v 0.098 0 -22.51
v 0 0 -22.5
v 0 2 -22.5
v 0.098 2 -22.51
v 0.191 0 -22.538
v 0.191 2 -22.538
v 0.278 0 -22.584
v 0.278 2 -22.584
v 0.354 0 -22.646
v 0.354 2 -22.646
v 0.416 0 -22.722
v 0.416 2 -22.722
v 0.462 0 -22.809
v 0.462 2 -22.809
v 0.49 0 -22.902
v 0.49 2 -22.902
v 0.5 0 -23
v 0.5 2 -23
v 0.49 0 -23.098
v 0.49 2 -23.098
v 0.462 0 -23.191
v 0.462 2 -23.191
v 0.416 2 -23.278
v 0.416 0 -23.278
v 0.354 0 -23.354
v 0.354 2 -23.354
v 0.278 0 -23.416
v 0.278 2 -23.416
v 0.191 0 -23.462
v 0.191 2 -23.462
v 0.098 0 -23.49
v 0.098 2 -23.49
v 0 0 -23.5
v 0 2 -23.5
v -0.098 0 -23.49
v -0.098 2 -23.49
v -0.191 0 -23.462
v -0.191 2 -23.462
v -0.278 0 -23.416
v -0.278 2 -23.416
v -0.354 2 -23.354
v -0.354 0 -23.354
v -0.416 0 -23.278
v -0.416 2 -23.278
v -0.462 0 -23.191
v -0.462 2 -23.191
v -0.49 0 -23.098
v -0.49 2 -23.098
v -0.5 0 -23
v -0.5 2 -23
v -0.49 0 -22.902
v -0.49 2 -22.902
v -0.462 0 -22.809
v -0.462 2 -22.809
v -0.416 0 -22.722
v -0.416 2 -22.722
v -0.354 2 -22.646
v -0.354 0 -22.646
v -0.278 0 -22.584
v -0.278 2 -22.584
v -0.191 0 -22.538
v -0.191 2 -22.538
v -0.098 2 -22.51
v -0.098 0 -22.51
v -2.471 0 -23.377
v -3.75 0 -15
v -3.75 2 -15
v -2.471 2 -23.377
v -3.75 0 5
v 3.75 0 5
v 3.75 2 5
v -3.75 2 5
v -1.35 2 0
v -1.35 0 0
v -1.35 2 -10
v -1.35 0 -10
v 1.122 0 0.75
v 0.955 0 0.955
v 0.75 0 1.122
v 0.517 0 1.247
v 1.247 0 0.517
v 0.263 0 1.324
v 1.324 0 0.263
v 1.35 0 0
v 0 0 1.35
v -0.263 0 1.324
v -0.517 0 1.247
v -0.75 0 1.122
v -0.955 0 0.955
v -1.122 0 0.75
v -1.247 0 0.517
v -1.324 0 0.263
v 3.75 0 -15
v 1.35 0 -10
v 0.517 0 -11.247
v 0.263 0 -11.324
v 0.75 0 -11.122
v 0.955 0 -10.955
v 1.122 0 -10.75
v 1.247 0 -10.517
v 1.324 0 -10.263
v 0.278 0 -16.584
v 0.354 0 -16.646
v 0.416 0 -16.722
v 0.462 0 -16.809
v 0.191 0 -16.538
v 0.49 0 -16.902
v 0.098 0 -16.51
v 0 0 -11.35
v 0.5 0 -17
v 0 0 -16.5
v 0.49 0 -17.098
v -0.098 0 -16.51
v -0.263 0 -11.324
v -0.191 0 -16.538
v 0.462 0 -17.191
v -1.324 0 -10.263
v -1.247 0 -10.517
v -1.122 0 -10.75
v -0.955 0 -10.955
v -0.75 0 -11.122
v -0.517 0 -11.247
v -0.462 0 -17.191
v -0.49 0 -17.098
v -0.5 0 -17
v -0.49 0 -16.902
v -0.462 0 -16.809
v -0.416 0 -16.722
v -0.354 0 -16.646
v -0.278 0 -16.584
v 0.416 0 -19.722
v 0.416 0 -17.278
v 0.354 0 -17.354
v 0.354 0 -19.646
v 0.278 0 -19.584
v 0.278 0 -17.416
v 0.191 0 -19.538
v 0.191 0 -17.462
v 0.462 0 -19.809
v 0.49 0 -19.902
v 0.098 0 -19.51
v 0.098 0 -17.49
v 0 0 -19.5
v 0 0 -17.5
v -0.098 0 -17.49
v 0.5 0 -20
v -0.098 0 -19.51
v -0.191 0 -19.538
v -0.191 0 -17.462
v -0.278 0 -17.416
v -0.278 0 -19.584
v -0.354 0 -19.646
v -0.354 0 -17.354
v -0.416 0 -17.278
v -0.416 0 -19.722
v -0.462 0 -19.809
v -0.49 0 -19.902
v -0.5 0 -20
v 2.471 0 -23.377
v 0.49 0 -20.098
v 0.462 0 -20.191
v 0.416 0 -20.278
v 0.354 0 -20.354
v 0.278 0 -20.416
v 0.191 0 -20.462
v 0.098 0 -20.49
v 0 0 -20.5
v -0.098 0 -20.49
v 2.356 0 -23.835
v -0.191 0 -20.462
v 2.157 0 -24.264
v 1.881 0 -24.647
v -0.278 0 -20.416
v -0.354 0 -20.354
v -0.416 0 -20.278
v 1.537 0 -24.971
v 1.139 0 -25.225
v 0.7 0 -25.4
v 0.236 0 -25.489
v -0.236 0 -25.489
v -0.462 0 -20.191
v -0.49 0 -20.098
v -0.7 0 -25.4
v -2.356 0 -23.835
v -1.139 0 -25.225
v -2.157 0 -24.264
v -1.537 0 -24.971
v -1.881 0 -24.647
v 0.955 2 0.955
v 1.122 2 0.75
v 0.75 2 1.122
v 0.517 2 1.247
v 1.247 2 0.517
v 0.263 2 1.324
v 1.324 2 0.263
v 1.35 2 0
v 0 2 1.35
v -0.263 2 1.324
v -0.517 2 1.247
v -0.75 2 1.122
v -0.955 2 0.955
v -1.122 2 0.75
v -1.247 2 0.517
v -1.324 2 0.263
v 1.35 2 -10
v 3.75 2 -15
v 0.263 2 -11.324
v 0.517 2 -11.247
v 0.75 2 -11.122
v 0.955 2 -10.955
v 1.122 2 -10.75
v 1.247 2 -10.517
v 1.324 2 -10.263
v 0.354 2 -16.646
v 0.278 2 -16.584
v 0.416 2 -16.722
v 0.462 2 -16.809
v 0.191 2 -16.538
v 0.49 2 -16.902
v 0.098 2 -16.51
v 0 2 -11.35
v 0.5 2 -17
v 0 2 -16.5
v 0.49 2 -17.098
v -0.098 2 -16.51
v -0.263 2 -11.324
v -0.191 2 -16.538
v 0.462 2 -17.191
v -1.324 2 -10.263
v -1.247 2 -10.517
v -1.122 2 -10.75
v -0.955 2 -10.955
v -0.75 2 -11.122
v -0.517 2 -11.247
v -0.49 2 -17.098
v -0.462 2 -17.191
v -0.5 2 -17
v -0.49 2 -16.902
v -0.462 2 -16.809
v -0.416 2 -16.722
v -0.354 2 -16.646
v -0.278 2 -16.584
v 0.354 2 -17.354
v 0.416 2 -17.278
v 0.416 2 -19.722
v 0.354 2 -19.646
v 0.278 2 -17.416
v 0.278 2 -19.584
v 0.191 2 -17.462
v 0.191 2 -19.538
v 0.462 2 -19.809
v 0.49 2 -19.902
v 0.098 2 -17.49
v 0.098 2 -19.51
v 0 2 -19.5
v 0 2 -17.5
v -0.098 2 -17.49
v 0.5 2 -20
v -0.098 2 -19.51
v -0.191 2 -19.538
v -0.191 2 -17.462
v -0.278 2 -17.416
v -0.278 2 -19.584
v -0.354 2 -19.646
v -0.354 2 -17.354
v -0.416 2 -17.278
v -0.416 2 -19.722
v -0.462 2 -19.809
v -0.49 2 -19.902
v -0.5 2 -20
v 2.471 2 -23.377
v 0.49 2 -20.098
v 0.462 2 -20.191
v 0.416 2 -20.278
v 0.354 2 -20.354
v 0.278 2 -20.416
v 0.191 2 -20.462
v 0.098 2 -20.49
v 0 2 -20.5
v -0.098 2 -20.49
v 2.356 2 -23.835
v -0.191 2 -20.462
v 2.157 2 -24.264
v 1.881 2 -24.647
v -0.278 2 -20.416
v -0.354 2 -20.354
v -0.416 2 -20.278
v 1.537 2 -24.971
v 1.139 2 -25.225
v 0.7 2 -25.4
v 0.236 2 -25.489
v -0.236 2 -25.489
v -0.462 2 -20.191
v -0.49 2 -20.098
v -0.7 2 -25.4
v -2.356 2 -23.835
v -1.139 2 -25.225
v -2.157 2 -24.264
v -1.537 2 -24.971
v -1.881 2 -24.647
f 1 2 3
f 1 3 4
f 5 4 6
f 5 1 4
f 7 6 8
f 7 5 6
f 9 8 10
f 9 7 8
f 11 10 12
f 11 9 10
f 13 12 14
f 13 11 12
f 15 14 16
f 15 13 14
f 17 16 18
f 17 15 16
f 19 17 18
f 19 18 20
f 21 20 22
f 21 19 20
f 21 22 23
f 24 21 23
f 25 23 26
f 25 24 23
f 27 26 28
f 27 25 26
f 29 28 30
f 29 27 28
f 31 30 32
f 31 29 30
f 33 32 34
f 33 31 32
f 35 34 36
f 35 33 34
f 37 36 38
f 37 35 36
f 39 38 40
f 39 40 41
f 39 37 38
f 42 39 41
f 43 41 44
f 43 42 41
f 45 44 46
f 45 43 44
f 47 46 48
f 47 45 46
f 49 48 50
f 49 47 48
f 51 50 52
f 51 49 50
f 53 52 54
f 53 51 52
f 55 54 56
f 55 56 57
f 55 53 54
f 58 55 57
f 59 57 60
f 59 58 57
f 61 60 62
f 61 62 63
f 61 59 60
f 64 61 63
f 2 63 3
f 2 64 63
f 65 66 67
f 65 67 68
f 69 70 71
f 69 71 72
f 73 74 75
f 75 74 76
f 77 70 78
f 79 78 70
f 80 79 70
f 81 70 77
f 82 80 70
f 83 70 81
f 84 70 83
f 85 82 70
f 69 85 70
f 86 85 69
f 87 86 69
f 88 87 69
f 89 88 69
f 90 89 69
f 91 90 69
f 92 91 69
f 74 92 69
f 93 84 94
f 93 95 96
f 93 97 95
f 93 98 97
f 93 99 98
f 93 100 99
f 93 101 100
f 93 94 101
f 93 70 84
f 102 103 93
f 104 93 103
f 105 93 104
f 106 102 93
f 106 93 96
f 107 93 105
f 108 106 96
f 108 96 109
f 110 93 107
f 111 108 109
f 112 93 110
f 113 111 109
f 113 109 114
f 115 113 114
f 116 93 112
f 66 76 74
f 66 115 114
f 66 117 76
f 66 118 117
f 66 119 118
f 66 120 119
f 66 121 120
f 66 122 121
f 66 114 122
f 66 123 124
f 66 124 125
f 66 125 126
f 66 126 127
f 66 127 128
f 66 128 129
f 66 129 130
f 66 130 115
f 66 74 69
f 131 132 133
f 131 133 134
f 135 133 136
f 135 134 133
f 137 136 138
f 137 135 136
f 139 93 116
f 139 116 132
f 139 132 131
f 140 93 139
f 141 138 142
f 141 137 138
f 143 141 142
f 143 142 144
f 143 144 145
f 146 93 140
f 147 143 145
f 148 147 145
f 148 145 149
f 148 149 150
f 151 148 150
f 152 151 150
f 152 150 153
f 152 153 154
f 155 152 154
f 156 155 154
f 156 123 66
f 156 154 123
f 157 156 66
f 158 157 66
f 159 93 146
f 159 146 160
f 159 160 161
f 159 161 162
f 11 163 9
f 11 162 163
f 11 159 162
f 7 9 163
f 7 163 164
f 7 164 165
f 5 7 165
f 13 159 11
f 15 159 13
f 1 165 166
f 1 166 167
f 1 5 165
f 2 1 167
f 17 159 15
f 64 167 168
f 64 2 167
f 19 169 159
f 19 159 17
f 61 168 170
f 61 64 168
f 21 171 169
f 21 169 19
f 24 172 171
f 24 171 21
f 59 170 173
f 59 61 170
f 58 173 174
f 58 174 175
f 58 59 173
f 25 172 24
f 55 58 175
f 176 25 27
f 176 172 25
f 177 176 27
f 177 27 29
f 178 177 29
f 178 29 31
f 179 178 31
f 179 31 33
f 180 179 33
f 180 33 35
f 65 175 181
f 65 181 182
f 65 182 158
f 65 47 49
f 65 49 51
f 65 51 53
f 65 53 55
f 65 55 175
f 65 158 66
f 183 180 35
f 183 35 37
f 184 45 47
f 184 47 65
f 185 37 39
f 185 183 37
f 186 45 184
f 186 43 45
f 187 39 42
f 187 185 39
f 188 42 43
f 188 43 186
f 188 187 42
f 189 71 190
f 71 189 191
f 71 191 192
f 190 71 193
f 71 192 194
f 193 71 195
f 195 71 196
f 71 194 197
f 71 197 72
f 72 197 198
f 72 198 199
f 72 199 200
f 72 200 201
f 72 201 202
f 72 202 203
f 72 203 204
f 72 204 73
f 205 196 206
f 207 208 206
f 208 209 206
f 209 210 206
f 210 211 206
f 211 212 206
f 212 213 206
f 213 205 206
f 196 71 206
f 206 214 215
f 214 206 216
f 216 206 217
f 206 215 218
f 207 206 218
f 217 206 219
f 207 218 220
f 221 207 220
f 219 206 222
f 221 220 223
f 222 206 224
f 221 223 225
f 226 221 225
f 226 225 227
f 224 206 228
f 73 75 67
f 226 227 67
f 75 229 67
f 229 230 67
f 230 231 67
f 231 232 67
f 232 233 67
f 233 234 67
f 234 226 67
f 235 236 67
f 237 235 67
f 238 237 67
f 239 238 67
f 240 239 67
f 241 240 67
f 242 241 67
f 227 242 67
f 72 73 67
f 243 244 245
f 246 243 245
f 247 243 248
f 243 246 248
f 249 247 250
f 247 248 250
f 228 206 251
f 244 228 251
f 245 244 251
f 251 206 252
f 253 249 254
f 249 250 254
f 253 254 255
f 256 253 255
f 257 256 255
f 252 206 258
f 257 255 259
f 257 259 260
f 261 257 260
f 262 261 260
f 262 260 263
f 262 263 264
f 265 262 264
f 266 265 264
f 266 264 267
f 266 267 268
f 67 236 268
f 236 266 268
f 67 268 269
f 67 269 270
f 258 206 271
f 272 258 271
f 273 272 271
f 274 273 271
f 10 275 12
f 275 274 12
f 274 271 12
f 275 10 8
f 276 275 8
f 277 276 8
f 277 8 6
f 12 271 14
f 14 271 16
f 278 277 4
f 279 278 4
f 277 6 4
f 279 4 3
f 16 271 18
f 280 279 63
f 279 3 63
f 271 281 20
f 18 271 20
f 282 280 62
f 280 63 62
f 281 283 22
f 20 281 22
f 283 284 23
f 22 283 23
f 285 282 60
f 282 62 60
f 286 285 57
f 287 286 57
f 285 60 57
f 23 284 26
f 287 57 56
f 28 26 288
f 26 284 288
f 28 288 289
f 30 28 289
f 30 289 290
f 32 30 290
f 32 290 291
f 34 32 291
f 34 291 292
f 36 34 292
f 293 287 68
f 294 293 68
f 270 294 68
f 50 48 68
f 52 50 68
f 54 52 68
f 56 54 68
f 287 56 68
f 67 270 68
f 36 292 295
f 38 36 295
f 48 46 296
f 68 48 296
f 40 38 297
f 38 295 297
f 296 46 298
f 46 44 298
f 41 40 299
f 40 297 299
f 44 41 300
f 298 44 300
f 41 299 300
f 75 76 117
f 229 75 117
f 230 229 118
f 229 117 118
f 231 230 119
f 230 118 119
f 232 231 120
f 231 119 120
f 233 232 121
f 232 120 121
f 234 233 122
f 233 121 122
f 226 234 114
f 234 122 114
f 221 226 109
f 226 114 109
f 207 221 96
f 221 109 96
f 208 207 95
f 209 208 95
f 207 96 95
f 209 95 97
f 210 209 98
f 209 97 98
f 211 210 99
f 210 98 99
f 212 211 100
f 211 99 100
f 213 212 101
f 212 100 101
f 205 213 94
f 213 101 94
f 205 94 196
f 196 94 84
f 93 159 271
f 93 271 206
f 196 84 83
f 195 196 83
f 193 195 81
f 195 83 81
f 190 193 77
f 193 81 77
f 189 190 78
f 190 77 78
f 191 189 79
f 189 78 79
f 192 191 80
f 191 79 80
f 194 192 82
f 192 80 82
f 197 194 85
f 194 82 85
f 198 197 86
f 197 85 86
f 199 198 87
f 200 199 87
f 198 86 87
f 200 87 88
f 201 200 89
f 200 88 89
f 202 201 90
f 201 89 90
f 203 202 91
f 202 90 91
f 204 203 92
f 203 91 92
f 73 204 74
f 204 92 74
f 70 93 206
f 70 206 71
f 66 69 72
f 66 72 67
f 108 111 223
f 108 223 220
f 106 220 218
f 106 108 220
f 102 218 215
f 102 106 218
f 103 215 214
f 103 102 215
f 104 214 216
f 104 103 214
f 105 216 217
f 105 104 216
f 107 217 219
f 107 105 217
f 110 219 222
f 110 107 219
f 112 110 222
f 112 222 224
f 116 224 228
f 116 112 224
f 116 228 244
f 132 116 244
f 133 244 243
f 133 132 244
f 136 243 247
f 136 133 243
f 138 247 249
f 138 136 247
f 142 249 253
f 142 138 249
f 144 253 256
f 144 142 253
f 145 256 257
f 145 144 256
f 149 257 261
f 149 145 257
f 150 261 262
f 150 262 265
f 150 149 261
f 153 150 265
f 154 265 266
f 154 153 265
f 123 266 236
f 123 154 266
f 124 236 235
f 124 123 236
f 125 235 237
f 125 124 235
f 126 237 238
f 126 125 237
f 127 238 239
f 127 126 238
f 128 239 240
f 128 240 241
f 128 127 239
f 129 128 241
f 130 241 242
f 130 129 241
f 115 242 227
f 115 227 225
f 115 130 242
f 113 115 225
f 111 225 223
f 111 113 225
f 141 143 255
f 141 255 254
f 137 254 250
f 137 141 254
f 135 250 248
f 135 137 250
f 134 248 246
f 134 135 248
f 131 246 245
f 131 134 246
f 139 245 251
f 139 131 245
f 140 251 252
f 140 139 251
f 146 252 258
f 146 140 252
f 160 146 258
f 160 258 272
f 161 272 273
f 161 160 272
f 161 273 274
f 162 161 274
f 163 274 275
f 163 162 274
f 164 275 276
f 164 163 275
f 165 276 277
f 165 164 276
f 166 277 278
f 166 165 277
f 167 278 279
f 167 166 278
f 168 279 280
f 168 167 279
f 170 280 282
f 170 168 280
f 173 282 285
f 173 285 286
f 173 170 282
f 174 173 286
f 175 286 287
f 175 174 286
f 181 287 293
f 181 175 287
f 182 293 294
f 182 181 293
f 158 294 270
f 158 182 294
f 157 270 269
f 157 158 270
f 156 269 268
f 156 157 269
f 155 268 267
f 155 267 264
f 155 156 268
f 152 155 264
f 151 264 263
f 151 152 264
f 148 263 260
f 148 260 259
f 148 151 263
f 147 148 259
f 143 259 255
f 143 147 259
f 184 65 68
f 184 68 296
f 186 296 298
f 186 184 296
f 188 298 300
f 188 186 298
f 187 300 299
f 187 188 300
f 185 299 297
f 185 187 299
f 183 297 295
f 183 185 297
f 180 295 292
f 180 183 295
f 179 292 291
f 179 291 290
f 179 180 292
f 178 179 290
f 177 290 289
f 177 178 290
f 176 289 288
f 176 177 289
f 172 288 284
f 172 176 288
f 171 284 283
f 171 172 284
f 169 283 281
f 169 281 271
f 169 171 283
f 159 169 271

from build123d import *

# Parameters (mm, degrees)
ESQUISSE1_R        = 0.5
BOSS_EXTRU_4_DEPTH = 2


with BuildPart() as part:
    # Esquisse1 → Boss.-Extru.4 (new body)
    with BuildSketch(Plane(origin=(0, 0, 0), x_dir=(1, 0, 0), z_dir=(0, 1, 0))):
        with BuildLine():
            Line((-3.75, 15), (-2.471378864, 23.377208842))
            ThreePointArc((-2.471378864, 23.377208842), (0, 25.5), (2.471378864, 23.377208842))
            Line((2.471378864, 23.377208842), (3.75, 15))
            Line((3.75, 15), (3.75, -5))
            Line((3.75, -5), (-3.75, -5))
            Line((-3.75, -5), (-3.75, 15))
        make_face()
        with Locations(Location((0, 23, 0), (0, 0, 270))):
            Circle(ESQUISSE1_R, mode=Mode.SUBTRACT)
        with Locations(Location((0, 20, 0), (0, 0, 270))):
            Circle(ESQUISSE1_R, mode=Mode.SUBTRACT)
        with Locations(Location((0, 17, 0), (0, 0, 270))):
            Circle(ESQUISSE1_R, mode=Mode.SUBTRACT)
        with BuildLine():
            Line((-1.35, 0), (-1.35, 10))
            ThreePointArc((-1.35, 10), (0, 11.35), (1.35, 10))
            Line((1.35, 10), (1.35, 0))
            ThreePointArc((1.35, 0), (0, -1.35), (-1.35, 0))
        make_face(mode=Mode.SUBTRACT)
    extrude(amount=BOSS_EXTRU_4_DEPTH)


solid = part.part
